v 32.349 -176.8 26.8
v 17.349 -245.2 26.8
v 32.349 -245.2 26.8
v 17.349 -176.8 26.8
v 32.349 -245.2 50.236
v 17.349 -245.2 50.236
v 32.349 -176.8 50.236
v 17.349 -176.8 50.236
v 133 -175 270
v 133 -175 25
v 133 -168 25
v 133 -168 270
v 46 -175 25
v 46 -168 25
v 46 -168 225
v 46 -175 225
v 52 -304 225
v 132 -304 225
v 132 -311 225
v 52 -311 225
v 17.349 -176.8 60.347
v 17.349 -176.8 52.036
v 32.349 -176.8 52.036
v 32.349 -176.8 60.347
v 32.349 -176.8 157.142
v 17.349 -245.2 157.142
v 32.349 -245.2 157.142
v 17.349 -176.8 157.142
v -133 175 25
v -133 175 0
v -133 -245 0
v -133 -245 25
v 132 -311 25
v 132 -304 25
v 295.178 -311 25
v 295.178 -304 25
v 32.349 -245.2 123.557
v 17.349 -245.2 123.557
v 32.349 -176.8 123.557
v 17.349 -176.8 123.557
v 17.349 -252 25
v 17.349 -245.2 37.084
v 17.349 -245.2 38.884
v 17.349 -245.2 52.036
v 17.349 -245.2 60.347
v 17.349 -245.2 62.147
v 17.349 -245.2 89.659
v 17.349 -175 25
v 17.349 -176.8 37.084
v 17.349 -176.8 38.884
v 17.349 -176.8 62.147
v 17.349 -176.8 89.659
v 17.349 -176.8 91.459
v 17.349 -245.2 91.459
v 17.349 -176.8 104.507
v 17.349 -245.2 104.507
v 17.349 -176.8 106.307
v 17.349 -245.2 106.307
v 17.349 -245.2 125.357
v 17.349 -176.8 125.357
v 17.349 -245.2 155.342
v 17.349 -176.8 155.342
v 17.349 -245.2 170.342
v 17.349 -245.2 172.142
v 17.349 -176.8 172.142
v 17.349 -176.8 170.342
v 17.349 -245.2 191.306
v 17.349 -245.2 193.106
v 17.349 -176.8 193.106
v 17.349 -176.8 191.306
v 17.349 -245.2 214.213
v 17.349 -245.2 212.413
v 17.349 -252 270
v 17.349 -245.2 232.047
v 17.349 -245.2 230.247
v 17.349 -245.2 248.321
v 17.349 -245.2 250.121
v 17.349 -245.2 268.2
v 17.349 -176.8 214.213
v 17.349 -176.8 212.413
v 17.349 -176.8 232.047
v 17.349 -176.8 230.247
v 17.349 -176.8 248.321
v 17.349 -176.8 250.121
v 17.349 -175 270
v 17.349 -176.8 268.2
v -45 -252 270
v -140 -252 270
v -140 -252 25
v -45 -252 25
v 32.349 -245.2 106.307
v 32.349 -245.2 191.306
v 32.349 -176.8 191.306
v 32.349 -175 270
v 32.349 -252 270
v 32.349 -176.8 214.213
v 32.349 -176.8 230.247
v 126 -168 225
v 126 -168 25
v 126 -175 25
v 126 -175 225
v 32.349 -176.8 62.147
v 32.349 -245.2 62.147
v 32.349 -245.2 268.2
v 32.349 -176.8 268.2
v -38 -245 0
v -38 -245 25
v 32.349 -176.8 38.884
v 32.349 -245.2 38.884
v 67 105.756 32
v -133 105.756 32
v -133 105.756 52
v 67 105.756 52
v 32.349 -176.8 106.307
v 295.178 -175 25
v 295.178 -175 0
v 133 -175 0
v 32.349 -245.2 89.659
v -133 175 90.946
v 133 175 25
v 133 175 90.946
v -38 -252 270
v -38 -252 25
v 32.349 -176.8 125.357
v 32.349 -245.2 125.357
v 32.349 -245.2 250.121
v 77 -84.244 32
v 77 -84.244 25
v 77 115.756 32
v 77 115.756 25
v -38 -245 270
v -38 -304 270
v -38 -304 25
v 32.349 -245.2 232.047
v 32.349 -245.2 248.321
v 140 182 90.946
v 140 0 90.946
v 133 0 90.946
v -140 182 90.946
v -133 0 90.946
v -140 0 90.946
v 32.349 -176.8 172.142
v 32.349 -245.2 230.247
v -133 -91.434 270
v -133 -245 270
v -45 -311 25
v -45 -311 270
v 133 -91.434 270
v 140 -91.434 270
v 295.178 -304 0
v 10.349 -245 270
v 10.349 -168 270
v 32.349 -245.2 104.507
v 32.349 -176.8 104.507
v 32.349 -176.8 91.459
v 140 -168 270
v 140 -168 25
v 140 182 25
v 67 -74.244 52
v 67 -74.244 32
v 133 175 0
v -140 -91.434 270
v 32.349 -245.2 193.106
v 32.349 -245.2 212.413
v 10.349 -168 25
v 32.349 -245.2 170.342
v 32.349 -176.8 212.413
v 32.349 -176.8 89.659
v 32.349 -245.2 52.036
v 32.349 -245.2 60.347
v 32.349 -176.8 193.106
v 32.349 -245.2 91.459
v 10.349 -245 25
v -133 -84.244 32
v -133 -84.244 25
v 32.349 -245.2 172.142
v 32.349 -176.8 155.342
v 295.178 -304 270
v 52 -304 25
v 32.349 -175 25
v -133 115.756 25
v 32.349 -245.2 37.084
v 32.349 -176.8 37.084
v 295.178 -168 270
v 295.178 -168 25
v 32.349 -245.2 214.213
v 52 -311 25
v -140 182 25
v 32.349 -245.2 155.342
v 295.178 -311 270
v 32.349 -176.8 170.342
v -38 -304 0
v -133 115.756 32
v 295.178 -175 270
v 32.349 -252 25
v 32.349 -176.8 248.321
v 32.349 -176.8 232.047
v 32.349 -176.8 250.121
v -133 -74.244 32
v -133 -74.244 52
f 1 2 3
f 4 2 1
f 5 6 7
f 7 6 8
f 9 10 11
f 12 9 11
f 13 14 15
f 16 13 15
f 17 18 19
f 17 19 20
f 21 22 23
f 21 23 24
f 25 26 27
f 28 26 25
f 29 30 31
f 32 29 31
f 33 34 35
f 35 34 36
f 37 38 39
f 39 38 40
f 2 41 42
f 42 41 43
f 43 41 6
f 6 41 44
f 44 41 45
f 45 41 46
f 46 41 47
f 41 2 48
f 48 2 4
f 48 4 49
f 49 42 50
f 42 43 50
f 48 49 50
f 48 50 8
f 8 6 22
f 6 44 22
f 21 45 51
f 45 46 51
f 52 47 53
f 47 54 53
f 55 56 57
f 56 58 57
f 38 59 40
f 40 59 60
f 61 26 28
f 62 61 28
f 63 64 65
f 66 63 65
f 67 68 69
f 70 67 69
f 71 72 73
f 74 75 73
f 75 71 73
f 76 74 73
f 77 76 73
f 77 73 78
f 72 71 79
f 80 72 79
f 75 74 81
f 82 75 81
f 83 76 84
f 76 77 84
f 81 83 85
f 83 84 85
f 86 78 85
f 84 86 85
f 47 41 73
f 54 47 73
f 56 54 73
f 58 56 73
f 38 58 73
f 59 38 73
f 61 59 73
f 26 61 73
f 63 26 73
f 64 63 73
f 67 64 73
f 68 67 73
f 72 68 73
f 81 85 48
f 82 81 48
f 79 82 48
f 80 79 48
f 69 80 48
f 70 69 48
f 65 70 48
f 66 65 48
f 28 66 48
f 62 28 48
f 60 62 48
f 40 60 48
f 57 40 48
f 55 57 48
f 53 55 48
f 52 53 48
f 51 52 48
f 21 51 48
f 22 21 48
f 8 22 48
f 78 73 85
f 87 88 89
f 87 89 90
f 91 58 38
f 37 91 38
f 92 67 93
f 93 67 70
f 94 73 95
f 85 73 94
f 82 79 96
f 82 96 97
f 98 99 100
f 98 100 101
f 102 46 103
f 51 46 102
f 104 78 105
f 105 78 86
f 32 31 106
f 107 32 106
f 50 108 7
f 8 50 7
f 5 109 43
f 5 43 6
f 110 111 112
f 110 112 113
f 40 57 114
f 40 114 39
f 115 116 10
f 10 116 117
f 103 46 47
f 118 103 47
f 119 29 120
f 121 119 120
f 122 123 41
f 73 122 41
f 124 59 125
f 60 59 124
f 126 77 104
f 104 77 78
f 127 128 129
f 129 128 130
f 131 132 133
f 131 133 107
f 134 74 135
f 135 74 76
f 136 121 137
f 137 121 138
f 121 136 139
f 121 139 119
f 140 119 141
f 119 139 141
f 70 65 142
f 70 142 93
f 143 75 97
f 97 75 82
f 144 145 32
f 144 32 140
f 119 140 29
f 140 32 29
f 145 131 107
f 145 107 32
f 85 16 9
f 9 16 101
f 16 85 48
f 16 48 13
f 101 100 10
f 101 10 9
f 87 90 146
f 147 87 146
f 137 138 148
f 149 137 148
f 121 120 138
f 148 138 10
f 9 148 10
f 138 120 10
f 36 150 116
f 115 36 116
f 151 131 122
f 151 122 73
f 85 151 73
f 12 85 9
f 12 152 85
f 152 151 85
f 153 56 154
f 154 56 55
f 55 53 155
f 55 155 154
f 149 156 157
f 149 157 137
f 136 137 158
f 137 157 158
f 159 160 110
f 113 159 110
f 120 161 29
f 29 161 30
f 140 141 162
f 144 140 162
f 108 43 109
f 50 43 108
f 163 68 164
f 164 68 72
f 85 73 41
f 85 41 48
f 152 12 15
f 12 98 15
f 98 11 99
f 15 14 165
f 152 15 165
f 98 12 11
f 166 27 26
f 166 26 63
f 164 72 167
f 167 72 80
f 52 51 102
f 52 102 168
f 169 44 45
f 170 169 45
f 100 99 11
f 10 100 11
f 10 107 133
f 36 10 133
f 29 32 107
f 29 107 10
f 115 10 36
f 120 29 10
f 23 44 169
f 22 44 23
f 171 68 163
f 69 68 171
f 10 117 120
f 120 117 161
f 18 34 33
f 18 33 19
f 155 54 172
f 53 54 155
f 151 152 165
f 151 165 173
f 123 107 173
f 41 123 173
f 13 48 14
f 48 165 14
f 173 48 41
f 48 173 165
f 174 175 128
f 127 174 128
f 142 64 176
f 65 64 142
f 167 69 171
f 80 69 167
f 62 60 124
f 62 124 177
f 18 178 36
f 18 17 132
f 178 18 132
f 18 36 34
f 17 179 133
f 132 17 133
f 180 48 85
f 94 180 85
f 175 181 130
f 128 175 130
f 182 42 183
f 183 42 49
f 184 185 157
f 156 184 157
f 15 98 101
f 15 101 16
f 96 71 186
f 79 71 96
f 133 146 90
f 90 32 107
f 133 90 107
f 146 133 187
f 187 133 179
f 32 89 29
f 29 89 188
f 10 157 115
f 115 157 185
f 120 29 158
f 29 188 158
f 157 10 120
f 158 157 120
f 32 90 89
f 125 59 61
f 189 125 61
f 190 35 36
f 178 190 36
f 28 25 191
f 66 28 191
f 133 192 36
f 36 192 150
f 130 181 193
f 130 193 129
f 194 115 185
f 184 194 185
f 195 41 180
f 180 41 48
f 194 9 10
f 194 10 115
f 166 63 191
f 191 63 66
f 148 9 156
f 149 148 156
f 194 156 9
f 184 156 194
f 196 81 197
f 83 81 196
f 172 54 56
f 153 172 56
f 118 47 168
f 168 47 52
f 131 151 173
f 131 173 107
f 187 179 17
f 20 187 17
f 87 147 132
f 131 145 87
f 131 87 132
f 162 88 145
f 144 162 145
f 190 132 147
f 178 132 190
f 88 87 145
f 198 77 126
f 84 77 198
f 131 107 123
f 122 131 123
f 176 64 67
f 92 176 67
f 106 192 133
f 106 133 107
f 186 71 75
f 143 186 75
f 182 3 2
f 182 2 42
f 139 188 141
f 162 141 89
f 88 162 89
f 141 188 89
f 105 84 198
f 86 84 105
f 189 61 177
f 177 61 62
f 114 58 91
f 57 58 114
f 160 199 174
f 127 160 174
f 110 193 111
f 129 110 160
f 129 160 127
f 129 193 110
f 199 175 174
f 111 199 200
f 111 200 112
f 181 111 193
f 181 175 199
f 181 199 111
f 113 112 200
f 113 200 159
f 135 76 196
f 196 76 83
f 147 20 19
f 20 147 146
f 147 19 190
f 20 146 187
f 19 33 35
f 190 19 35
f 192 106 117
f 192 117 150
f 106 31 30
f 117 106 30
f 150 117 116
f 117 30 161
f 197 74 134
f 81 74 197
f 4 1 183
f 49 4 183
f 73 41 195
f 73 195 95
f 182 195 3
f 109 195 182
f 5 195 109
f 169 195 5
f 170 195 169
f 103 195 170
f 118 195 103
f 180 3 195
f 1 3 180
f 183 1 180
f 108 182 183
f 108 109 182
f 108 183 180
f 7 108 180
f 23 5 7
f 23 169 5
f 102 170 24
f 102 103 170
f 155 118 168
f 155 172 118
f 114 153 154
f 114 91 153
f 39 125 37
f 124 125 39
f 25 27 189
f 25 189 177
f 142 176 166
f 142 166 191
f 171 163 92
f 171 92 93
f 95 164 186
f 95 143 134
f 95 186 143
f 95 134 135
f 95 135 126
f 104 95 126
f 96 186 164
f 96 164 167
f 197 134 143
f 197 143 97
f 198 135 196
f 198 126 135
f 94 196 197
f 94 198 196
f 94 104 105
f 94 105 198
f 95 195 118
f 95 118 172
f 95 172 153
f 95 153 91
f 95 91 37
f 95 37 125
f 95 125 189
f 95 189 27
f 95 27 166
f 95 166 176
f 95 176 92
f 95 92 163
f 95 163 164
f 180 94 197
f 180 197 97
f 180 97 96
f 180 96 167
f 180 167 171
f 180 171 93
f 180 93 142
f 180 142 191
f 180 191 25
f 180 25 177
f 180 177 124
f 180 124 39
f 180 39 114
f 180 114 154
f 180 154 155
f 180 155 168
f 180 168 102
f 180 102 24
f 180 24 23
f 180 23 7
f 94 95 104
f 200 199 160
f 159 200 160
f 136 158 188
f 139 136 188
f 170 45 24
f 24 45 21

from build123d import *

# Parameters (mm, degrees)
F0_W      = 95
F0_H      = 70
F0_W_2    = 51
F0_H_2    = 59
F1_DEPTH  = 25
F3_DEPTH  = 245
F5_DEPTH  = 245
F6_W      = 80
F6_H      = 200
F7_DEPTH  = 25
F8_W      = 210
F8_H      = 200
F9_DEPTH  = 7
F10_W     = 200
F10_H     = 180
F11_DEPTH = 20
F13_DEPTH = 435.1790014882
F14_W     = 80
F14_H     = 200
F15_DEPTH = 25
F16_W     = 77
F16_H     = 245
F16_W_2   = 68.4
F16_H_2   = 10.2841026306
F16_H_3   = 11.3519883871
F16_H_4   = 8.3111382246
F16_H_5   = 27.5120890856
F16_H_6   = 13.0481279612
F16_H_7   = 17.2495550632
F16_H_8   = 29.9851752043
F16_H_9   = 13.1993598461
F16_H_10  = 19.1645032883
F16_H_11  = 19.3067646742
F16_H_12  = 16.0344398737
F16_H_13  = 16.2738270283
F16_H_14  = 18.0789287329
F17_DEPTH = 15


with BuildPart() as f1:
    # F0 (on Top) → F1 (new body)
    with BuildSketch(Plane.XY):
        Polygon((133, -175), (133, 175), (-133, 175), (-133, -175), (-38, -175), (13, -175), (45, -175), align=None)
        Polygon((295.1780014882, -175), (133, -175), (45, -175), (13, -175), (13, -245), (13, -304), (295.1780014882, -304), align=None)
        with Locations((-85.5, -210)):
            Rectangle(F0_W, F0_H)
        with Locations((-12.5, -210)):
            Rectangle(F0_W_2, F0_H)
        with Locations((-12.5, -274.5)):
            Rectangle(F0_W_2, F0_H_2)
    extrude(amount=F1_DEPTH)


with BuildPart() as f3:
    # F2 (on face) → F3 (new body)
    with BuildSketch(Plane.XY.offset(25)):
        Polygon((-45, -311), (295.1780014882, -311), (295.1780014882, -304), (-38, -304), (-38, -245), (-133, -245), (-133, 175), (133, 175), (133, -175), (295.1780014882, -175), (295.1780014882, -168), (140, -168), (140, 182), (-140, 182), (-140, -252), (-45, -252), align=None)
    extrude(amount=F3_DEPTH)

    # F12 (on face) → F13 (cut, through all)
    with BuildSketch(Plane(origin=(-140, 0, 0), x_dir=(0, -1, 0), z_dir=(-1, 0, 0))):
        Polygon((-215.9370332956, 327.1400332451), (-215.9370332956, 90.94594419), (0, 90.94594419), (91.4338827133, 270), (91.4338827133, 327.1400332451), align=None)
    extrude(amount=-F13_DEPTH, mode=Mode.SUBTRACT)

    # F14 (on face) → F15 (cut)
    with BuildSketch(Plane(origin=(0, -304, 0), x_dir=(-1, 0, 0), z_dir=(0, 1, 0))):
        with Locations((-92, 125)):
            Rectangle(F14_W, F14_H)
    extrude(amount=-F15_DEPTH, mode=Mode.SUBTRACT)


with BuildPart() as f5:
    # F4 (on face) → F5 (new body, through all)
    with BuildSketch(Plane.XY.offset(25)):
        Polygon((17.349066928, -175), (133, -175), (133, -168), (10.349066928, -168), (10.349066928, -245), (-38, -245), (-38, -252), (17.349066928, -252), align=None)
    extrude(amount=F5_DEPTH)

    # F6 (on face) → F7 (cut)
    with BuildSketch(Plane(origin=(0, -168, 0), x_dir=(-1, 0, 0), z_dir=(0, 1, 0))):
        with Locations((-86, 125)):
            Rectangle(F6_W, F6_H)
    extrude(amount=-F7_DEPTH, mode=Mode.SUBTRACT)


with BuildPart() as f9:
    # F8 (on face) → F9 (new body)
    with BuildSketch(Plane.XY.offset(25)):
        with Locations((-28, 15.7558605075)):
            Rectangle(F8_W, F8_H)
    extrude(amount=F9_DEPTH)

    # F10 (on face) → F11 (join)
    with BuildSketch(Plane.XY.offset(32)):
        with Locations((-33, 15.7558605075)):
            Rectangle(F10_W, F10_H)
    extrude(amount=F11_DEPTH)


with BuildPart() as f17:
    # F16 (on face) → F17 (new body)
    with BuildSketch(Plane.YZ.offset(17.349066928)):
        with Locations((-213.5, 147.5)):
            Rectangle(F16_W, F16_H)
        with Locations((-211, 31.9420513153)):
            Rectangle(F16_W_2, F16_H_2, mode=Mode.SUBTRACT)
        with Locations((-211, 44.5600968242)):
            Rectangle(F16_W_2, F16_H_3, mode=Mode.SUBTRACT)
        with Locations((-211, 56.19166013)):
            Rectangle(F16_W_2, F16_H_4, mode=Mode.SUBTRACT)
        with Locations((-211, 75.9032737851)):
            Rectangle(F16_W_2, F16_H_5, mode=Mode.SUBTRACT)
        with Locations((-211, 97.9833823085)):
            Rectangle(F16_W_2, F16_H_6, mode=Mode.SUBTRACT)
        with Locations((-211, 114.9322238207)):
            Rectangle(F16_W_2, F16_H_7, mode=Mode.SUBTRACT)
        with Locations((-211, 140.3495889544)):
            Rectangle(F16_W_2, F16_H_8, mode=Mode.SUBTRACT)
        with Locations((-211, 163.7418564796)):
            Rectangle(F16_W_2, F16_H_9, mode=Mode.SUBTRACT)
        with Locations((-211, 181.7237880468)):
            Rectangle(F16_W_2, F16_H_10, mode=Mode.SUBTRACT)
        with Locations((-211, 202.7594220281)):
            Rectangle(F16_W_2, F16_H_11, mode=Mode.SUBTRACT)
        with Locations((-211, 222.230024302)):
            Rectangle(F16_W_2, F16_H_12, mode=Mode.SUBTRACT)
        with Locations((-211, 240.184157753)):
            Rectangle(F16_W_2, F16_H_13, mode=Mode.SUBTRACT)
        with Locations((-211, 259.1605356336)):
            Rectangle(F16_W_2, F16_H_14, mode=Mode.SUBTRACT)
    extrude(amount=F17_DEPTH)


solid = Compound([f1.part, f3.part, f5.part, f9.part, f17.part])
